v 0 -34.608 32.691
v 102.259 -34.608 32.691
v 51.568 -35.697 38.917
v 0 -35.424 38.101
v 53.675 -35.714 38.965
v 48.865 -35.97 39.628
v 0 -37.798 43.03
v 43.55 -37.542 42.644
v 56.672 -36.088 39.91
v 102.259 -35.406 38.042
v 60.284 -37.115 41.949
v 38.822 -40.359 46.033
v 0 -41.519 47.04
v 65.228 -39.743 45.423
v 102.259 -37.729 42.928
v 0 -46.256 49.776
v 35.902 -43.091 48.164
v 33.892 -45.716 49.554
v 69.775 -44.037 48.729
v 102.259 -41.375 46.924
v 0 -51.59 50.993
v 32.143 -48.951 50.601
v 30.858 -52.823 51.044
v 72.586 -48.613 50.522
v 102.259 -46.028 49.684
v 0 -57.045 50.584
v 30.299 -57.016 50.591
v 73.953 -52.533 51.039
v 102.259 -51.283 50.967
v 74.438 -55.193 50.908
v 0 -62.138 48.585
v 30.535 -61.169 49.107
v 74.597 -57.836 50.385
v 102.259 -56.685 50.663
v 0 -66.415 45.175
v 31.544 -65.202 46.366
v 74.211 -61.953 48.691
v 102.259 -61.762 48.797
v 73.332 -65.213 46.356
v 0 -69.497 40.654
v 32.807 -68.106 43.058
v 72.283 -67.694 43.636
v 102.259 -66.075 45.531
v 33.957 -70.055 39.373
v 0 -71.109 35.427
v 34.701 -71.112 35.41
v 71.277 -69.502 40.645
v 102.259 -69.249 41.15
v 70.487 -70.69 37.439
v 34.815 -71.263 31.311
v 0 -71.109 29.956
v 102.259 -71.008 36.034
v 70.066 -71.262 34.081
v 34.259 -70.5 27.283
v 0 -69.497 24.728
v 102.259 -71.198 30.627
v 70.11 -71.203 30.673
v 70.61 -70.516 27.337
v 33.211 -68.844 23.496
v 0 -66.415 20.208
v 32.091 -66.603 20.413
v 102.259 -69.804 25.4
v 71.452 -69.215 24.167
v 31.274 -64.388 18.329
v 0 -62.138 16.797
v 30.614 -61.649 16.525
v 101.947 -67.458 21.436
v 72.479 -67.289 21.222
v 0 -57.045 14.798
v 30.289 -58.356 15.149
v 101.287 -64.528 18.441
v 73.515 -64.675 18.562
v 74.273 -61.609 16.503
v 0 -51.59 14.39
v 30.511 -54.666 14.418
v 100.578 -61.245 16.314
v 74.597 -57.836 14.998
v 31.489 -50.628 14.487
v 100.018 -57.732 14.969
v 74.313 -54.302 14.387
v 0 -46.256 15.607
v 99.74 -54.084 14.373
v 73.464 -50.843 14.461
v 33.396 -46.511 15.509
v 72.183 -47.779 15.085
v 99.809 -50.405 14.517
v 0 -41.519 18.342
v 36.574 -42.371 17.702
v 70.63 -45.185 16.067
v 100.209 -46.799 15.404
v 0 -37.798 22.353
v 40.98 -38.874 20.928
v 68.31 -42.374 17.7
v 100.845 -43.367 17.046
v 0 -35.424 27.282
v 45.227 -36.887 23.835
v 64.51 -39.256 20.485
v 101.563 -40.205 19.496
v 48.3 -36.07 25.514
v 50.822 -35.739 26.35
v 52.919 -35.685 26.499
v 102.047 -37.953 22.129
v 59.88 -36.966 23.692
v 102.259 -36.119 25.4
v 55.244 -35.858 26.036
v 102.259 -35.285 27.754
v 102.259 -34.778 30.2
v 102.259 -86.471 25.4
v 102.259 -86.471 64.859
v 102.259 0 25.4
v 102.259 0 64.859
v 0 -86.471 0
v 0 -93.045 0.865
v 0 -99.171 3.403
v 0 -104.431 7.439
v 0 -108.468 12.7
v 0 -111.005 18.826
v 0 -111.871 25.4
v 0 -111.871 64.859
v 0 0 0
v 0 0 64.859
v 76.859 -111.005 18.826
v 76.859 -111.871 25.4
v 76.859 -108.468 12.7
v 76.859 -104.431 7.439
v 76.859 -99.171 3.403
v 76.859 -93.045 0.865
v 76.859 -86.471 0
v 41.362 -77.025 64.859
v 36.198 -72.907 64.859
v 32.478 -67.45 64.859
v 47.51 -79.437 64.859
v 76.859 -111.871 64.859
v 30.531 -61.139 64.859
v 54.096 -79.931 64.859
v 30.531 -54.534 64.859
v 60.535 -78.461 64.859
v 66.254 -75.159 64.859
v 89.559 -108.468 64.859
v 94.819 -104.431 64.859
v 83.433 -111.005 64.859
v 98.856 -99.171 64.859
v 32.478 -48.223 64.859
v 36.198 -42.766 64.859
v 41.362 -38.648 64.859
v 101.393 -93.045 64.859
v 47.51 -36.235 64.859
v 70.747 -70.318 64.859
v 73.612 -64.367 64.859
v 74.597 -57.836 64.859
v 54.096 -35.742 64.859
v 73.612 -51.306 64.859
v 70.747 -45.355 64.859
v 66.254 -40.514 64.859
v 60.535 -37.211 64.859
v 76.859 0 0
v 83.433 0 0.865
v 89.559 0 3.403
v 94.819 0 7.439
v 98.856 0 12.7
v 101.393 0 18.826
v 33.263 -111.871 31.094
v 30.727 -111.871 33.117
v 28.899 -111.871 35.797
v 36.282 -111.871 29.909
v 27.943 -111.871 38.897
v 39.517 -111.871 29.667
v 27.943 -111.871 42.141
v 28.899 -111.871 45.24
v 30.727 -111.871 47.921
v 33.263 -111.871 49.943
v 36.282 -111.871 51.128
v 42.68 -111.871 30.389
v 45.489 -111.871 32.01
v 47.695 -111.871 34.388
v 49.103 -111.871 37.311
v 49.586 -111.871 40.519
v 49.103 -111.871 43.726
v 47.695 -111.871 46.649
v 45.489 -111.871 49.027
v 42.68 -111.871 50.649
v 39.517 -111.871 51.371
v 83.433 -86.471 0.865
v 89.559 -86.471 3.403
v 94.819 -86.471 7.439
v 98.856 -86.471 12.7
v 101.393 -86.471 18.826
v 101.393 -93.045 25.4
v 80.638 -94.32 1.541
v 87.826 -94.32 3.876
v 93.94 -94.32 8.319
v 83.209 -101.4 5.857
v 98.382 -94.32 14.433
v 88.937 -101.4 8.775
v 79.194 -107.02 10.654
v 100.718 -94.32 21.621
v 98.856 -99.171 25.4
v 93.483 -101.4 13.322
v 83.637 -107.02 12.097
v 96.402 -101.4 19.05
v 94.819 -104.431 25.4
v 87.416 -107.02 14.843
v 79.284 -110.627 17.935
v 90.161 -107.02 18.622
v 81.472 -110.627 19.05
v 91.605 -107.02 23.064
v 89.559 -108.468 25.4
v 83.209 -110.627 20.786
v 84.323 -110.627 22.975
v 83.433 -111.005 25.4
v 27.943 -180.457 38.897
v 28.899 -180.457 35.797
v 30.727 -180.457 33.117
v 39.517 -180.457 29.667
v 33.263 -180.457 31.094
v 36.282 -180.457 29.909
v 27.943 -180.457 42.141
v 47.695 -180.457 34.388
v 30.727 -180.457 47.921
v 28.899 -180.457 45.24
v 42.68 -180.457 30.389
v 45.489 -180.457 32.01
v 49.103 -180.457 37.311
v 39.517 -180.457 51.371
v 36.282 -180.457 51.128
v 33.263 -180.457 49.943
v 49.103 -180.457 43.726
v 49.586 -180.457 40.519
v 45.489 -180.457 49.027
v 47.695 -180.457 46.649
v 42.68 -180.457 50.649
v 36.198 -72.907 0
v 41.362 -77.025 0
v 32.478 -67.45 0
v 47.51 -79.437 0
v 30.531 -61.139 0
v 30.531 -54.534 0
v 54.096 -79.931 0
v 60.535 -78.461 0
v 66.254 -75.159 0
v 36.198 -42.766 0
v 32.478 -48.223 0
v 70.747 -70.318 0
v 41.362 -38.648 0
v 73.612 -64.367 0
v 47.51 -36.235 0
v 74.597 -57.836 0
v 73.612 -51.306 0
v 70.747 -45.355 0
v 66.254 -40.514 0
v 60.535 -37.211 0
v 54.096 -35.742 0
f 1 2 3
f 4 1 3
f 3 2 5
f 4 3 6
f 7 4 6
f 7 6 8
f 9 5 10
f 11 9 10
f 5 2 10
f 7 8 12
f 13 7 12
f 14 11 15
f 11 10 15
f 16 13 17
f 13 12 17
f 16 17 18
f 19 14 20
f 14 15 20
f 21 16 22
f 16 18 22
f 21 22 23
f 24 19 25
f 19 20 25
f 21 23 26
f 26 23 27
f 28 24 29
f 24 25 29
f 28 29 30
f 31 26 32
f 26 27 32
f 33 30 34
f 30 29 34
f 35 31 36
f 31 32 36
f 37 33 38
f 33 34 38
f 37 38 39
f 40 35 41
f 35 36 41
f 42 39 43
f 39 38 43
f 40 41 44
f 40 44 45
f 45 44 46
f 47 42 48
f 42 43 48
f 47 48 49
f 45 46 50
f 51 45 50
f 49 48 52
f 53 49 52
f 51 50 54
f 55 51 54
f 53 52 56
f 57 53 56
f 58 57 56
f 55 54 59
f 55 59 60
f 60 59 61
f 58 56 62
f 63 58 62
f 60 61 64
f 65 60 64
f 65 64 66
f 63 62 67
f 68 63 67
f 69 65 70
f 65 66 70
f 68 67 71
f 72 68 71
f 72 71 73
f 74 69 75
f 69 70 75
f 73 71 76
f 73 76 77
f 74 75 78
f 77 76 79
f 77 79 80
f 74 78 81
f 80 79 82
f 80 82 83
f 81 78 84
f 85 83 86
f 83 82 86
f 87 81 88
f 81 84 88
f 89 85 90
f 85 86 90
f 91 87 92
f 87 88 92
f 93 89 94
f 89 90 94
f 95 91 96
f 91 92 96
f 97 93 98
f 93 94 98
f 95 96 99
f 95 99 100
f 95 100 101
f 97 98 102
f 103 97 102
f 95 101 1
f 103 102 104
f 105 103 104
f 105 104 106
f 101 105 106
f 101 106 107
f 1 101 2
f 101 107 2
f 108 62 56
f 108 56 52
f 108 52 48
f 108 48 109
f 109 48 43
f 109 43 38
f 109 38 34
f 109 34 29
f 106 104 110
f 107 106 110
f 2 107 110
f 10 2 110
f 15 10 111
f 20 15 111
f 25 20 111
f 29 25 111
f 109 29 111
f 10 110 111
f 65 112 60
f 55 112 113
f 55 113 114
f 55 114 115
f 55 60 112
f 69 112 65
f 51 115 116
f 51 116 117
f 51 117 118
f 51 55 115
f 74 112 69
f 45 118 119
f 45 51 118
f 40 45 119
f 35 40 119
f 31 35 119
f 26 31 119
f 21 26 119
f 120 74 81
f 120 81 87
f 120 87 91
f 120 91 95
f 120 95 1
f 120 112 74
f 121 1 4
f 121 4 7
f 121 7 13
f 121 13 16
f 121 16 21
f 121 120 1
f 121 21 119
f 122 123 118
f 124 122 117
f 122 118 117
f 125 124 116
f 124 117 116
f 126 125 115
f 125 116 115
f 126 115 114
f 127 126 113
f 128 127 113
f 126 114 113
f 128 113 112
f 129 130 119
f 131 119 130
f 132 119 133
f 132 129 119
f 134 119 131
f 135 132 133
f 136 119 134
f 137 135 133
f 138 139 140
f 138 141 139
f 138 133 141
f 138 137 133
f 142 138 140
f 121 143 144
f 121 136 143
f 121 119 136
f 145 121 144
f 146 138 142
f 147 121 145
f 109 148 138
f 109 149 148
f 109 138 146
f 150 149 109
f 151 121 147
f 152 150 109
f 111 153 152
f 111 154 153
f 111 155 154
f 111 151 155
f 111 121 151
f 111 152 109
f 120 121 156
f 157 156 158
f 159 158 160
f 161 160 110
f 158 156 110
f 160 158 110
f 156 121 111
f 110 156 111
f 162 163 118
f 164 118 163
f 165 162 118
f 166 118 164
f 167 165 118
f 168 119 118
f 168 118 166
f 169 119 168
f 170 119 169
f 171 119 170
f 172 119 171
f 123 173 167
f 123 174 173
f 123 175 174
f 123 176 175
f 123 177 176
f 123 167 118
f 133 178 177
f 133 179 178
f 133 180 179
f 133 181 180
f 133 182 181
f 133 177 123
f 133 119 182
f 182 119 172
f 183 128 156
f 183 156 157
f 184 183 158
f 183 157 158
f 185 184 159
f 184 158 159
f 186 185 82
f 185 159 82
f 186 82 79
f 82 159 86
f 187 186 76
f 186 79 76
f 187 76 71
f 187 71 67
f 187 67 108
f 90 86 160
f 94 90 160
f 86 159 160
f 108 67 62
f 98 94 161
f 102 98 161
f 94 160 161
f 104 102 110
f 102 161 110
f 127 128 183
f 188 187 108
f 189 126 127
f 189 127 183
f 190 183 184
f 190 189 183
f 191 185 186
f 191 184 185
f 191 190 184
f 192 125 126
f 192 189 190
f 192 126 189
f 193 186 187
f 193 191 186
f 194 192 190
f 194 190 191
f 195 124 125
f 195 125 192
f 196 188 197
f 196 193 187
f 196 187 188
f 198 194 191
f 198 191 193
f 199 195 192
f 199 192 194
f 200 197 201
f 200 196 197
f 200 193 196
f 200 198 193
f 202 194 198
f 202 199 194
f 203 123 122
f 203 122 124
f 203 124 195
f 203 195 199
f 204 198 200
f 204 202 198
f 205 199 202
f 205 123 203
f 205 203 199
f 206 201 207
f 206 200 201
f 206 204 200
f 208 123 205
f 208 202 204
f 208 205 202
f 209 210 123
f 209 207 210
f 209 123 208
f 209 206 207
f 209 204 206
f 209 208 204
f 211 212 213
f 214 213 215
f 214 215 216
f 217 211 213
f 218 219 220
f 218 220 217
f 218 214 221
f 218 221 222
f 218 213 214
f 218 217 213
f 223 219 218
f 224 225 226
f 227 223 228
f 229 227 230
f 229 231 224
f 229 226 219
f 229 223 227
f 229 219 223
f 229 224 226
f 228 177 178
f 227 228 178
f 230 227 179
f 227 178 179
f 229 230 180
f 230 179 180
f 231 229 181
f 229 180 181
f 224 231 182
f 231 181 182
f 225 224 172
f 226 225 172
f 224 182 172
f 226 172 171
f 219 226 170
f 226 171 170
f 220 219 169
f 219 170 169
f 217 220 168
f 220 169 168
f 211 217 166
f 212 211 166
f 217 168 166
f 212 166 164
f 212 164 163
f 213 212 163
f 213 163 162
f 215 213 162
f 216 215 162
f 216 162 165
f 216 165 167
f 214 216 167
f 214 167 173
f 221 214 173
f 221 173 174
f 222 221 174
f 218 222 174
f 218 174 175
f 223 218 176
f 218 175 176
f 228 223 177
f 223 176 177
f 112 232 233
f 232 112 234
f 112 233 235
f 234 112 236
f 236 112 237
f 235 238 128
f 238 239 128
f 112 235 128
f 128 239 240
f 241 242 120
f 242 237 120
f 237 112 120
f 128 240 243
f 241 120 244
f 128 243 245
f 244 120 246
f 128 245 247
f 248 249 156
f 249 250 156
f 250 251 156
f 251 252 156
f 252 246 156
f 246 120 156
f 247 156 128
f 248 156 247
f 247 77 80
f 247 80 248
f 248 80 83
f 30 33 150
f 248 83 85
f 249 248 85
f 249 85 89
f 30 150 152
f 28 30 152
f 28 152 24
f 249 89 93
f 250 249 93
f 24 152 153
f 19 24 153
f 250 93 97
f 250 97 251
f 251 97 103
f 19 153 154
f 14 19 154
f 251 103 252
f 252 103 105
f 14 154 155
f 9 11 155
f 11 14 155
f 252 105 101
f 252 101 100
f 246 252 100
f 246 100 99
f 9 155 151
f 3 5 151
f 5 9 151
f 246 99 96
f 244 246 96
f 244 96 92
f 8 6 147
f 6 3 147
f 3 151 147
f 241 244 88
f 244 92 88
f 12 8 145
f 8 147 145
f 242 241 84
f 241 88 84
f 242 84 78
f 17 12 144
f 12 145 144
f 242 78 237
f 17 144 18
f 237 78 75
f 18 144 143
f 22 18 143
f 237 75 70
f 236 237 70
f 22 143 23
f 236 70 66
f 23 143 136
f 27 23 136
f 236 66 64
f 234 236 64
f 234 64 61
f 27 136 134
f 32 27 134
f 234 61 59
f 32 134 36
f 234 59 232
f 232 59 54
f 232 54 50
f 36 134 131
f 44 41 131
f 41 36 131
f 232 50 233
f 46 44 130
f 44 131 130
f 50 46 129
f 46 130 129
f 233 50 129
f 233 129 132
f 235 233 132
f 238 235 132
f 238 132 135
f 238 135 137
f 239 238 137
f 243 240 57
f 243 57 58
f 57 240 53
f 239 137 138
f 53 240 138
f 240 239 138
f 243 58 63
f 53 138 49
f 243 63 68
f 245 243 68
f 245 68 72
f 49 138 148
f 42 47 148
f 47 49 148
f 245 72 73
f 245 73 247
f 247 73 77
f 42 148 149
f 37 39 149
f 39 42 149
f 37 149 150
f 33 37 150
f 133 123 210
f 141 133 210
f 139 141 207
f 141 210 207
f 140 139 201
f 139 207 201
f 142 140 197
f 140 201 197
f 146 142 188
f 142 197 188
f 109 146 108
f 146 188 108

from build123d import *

# Parameters (mm, degrees)
F0_W         = 102.258592844
F0_H         = 64.8588836193
F1_DEPTH     = 111.87066
F2_R         = 22.1566524367
F3_DEPTH     = 123.47648
F4_R         = 18.3530030386
F5_DEPTH     = 205.67378
F6_T1_DEPTH  = 140.358592844
F6_T3_DEPTH  = 102.9588836193
F6_T5_DEPTH  = 149.97066
F6_S9_W      = 25.4
F6_S9_H      = 25.4
F6_T10_DEPTH = 25.4
F7_R         = 10.8823528673
F8_DEPTH     = 68.58648


# Not quite as in the source:
# - a fillet or chamfer that OpenCascade refuses, or shapes differently, is made with other operations: its cross-section is extruded or revolved along the edge and cut away or added


with BuildPart() as f1:
    # F0 (on Front) → F1 (new body)
    with BuildSketch(Plane.XZ):
        with Locations((51.129296422, 32.4294418097)):
            Rectangle(F0_W, F0_H)
    extrude(amount=F1_DEPTH)

    # F2 (on face) → F3 (cut)
    with BuildSketch(Plane.XY.offset(64.8588836193)):
        with Locations((52.4399839342, -57.8363165259)):
            Circle(F2_R)
    extrude(amount=-F3_DEPTH, mode=Mode.SUBTRACT)

    # F4 (on face) → F5 (cut)
    with BuildSketch(Plane.YZ.offset(102.258592844)):
        with Locations((-52.9614761472, 32.6913073659)):
            Circle(F4_R)
    extrude(amount=-F5_DEPTH, mode=Mode.SUBTRACT)

    # F6: fillet of radius 25.4 on 3 edges, made by hand

    # F6_s2 → F6_t1 (cut)
    with BuildSketch(Plane.YZ.offset(-63.5)):
        with BuildLine():
            ThreePointArc((-111.87066, 25.4), (-104.4311722421, 7.4394877579), (-86.47066, 0))
            Line((-86.47066, 0), (-111.87066, 0))
            Line((-111.87066, 0), (-111.87066, 25.4))
        make_face()
    extrude(amount=F6_T1_DEPTH, mode=Mode.SUBTRACT)

    # F6_s4 → F6_t3 (cut)
    with BuildSketch(Plane.XY.offset(25.4)):
        with BuildLine():
            ThreePointArc((76.858592844, -111.87066), (94.8191050861, -104.4311722421), (102.258592844, -86.47066))
            Line((102.258592844, -86.47066), (102.258592844, -111.87066))
            Line((102.258592844, -111.87066), (76.858592844, -111.87066))
        make_face()
    extrude(amount=F6_T3_DEPTH, mode=Mode.SUBTRACT)

    # F6_s6 → F6_t5 (cut)
    with BuildSketch(Plane.XZ.offset(-63.5)):
        with BuildLine():
            ThreePointArc((76.858592844, 0), (94.8191050861, 7.4394877579), (102.258592844, 25.4))
            Line((102.258592844, 25.4), (102.258592844, 0))
            Line((102.258592844, 0), (76.858592844, 0))
        make_face()
    extrude(amount=F6_T5_DEPTH, mode=Mode.SUBTRACT)


with BuildPart() as f6_tool8:
    # F6_s9 → F6_t10 (new body)
    with BuildSketch(Plane.XZ.offset(86.47066)):
        with Locations((89.558592844, 12.7)):
            Rectangle(F6_S9_W, F6_S9_H)
    extrude(amount=F6_T10_DEPTH)

    # F6_s11 → F6_t12 (revolve, cut)
    with BuildSketch(Plane(origin=(76.858592844, -86.47066, 25.4), x_dir=(-0.7071067812, 0, 0.7071067812), z_dir=(0.7071067812, 0, 0.7071067812))):
        with BuildLine():
            ThreePointArc((0, -25.4), (25.4, 0), (0, 25.4))
            Line((0, 25.4), (0, -25.4))
        make_face()
    revolve(axis=Axis((76.858592844, -86.47066, 25.4), (0, -1, 0)), mode=Mode.SUBTRACT)


with BuildPart() as f1_1:
    add(f1.part)

    # F6_t7: cut F6_tool8
    add(f6_tool8.part, mode=Mode.SUBTRACT)

    # F7 (on face) → F8 (join)
    with BuildSketch(Plane.XZ.offset(111.87066)):
        with Locations((38.7039594352, 40.518656373)):
            Circle(F7_R)
    extrude(amount=F8_DEPTH)


solid = f1_1.part
